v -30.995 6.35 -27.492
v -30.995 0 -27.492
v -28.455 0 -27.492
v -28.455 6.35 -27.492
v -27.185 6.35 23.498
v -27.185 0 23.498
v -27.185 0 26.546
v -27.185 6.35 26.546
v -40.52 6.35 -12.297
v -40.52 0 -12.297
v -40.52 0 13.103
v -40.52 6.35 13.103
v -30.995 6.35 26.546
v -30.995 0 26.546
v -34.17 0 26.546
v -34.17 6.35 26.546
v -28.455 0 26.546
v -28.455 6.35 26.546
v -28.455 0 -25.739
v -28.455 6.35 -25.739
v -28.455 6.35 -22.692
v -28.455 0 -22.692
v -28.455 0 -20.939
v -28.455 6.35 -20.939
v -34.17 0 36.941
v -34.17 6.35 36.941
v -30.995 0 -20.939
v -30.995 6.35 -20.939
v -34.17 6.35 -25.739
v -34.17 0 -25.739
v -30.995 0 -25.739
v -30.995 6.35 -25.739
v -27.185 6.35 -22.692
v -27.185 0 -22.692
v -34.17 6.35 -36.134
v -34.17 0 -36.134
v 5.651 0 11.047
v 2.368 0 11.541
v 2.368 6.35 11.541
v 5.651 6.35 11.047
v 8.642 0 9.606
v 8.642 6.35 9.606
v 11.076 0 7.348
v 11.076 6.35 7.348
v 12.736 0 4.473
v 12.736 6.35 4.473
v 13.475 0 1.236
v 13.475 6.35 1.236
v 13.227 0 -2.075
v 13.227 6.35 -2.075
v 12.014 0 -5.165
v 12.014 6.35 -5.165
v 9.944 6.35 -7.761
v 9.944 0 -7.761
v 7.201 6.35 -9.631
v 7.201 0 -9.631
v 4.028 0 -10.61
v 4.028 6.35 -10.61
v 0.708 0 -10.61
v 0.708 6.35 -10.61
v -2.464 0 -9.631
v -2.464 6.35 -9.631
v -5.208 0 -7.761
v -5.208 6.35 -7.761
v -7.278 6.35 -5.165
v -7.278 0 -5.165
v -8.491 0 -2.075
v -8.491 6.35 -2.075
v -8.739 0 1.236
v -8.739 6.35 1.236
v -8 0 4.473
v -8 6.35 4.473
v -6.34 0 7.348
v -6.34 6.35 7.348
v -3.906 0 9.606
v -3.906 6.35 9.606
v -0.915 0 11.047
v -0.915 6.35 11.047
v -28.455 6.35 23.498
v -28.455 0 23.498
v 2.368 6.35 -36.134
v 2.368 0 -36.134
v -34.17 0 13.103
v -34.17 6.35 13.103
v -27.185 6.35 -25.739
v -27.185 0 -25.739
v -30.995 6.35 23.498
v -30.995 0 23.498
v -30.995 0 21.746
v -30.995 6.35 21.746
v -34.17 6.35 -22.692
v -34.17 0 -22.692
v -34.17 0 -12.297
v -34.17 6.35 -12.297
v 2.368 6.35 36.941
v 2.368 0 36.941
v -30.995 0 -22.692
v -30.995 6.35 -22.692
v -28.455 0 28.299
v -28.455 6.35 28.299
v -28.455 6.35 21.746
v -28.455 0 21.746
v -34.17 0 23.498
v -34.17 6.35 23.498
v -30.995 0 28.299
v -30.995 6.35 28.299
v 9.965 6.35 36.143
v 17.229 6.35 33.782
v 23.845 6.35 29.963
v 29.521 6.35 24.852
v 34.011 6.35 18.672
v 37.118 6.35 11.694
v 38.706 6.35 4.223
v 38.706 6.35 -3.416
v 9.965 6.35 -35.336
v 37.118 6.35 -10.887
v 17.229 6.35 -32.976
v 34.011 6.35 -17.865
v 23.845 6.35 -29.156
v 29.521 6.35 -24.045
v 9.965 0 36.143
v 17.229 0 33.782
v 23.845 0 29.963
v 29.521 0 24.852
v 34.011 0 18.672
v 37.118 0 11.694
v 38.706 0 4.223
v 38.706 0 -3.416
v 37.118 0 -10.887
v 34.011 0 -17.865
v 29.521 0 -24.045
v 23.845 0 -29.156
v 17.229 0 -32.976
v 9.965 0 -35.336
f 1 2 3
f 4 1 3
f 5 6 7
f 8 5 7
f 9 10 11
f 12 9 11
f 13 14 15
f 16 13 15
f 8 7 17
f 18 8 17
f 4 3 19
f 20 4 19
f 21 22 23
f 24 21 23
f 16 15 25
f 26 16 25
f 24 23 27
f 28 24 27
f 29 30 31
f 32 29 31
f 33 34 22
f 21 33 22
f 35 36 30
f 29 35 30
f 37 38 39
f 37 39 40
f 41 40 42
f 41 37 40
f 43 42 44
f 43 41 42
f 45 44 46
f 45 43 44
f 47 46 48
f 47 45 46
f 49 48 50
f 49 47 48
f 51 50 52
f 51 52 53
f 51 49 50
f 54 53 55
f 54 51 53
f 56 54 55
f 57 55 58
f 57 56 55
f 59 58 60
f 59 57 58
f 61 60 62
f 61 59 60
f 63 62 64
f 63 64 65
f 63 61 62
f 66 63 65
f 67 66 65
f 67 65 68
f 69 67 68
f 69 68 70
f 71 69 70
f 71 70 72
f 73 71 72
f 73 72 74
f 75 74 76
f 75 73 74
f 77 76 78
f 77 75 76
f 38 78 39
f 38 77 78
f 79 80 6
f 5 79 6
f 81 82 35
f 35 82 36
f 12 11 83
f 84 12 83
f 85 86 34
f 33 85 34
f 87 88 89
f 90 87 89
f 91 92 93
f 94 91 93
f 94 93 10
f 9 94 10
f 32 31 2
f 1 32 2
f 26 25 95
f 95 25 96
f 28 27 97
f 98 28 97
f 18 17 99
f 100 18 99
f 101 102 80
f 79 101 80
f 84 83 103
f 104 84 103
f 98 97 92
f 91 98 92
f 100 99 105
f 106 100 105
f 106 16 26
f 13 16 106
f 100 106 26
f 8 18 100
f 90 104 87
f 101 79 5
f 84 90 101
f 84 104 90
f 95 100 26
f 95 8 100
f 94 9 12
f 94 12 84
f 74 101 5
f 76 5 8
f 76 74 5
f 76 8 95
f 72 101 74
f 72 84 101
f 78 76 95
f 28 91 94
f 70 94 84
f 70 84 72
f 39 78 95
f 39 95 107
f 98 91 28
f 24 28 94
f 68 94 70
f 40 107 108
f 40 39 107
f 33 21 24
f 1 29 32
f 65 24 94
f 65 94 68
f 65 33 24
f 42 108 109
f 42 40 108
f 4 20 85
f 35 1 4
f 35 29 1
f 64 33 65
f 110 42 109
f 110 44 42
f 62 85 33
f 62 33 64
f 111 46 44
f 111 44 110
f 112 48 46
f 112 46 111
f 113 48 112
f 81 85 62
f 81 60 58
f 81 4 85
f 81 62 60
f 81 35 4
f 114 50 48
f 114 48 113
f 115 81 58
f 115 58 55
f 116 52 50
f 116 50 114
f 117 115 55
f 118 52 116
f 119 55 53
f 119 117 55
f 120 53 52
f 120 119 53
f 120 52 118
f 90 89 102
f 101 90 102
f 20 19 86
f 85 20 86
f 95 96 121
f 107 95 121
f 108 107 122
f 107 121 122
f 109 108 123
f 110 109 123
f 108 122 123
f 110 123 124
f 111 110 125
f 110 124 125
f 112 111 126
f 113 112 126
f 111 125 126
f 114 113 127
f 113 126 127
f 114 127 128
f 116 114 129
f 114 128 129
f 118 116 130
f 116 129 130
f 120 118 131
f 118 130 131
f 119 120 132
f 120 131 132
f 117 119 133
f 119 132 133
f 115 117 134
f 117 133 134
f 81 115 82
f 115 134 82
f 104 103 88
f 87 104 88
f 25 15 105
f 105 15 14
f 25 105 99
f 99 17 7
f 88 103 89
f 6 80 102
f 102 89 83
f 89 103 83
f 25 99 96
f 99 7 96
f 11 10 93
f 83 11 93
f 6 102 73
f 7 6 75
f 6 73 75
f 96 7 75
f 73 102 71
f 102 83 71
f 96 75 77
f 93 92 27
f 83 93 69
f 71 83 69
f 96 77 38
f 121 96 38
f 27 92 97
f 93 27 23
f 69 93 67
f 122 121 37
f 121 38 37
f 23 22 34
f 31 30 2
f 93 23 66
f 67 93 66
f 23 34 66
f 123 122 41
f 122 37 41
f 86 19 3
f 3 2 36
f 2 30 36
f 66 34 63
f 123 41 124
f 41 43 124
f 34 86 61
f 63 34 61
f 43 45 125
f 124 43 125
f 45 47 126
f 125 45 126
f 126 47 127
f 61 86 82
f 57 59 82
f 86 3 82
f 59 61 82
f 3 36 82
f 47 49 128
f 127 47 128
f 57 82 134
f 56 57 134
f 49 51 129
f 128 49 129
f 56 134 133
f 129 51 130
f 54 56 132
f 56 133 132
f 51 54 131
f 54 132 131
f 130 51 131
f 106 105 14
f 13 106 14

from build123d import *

# Parameters (mm, degrees)
SKETCH1_R           = 11.1379
BOSS_EXTRUDE1_DEPTH = 6.35


with BuildPart() as part:
    # Sketch1 → Boss-Extrude1 (new body)
    with BuildSketch(Plane(origin=(0, 0, 0), x_dir=(1, 0, 0), z_dir=(0, 1, 0))):
        with BuildLine():
            Line((-34.169803213, 12.296548394), (-40.519803213, 12.296548394))
            Line((-40.519803213, 12.296548394), (-40.519803213, -13.103451606))
            Line((-40.519803213, -13.103451606), (-34.169803213, -13.103451606))
            Line((-34.169803213, -13.103451606), (-34.169803213, -23.498436767))
            Line((-34.169803213, -23.498436767), (-30.994803213, -23.498436767))
            Line((-30.994803213, -23.498436767), (-30.994803213, -21.745836767))
            Line((-30.994803213, -21.745836767), (-28.454803213, -21.745836767))
            Line((-28.454803213, -21.745836767), (-28.454803213, -23.498436767))
            Line((-28.454803213, -23.498436767), (-27.184803213, -23.498436767))
            Line((-27.184803213, -23.498436767), (-27.184803213, -26.546296123))
            Line((-27.184803213, -26.546296123), (-28.454803213, -26.546296123))
            Line((-28.454803213, -26.546296123), (-28.454803213, -28.298896123))
            Line((-28.454803213, -28.298896123), (-30.994803213, -28.298896123))
            Line((-30.994803213, -28.298896123), (-30.994803213, -26.546296123))
            Line((-30.994803213, -26.546296123), (-34.169803213, -26.546296123))
            Line((-34.169803213, -26.546296123), (-34.169803213, -36.941351606))
            Line((-34.169803213, -36.941351606), (2.368096787, -36.941351606))
            ThreePointArc((2.368096787, -36.941351606), (38.905996787, -0.403451606), (2.368096787, 36.134448394))
            Line((2.368096787, 36.134448394), (-34.169803213, 36.134448394))
            Line((-34.169803213, 36.134448394), (-34.169803213, 25.739463233))
            Line((-34.169803213, 25.739463233), (-30.994803213, 25.739463233))
            Line((-30.994803213, 25.739463233), (-30.994803213, 27.492063233))
            Line((-30.994803213, 27.492063233), (-28.454803213, 27.492063233))
            Line((-28.454803213, 27.492063233), (-28.454803213, 25.739463233))
            Line((-28.454803213, 25.739463233), (-27.184803213, 25.739463233))
            Line((-27.184803213, 25.739463233), (-27.184803213, 22.691603877))
            Line((-27.184803213, 22.691603877), (-28.454803213, 22.691603877))
            Line((-28.454803213, 22.691603877), (-28.454803213, 20.939003877))
            Line((-28.454803213, 20.939003877), (-30.994803213, 20.939003877))
            Line((-30.994803213, 20.939003877), (-30.994803213, 22.691603877))
            Line((-30.994803213, 22.691603877), (-34.169803213, 22.691603877))
            Line((-34.169803213, 22.691603877), (-34.169803213, 12.296548394))
        make_face()
        with Locations(Location((2.368096787, -0.403451606, 0), (0, 0, 270))):
            Circle(SKETCH1_R, mode=Mode.SUBTRACT)
    extrude(amount=BOSS_EXTRUDE1_DEPTH)


solid = part.part
